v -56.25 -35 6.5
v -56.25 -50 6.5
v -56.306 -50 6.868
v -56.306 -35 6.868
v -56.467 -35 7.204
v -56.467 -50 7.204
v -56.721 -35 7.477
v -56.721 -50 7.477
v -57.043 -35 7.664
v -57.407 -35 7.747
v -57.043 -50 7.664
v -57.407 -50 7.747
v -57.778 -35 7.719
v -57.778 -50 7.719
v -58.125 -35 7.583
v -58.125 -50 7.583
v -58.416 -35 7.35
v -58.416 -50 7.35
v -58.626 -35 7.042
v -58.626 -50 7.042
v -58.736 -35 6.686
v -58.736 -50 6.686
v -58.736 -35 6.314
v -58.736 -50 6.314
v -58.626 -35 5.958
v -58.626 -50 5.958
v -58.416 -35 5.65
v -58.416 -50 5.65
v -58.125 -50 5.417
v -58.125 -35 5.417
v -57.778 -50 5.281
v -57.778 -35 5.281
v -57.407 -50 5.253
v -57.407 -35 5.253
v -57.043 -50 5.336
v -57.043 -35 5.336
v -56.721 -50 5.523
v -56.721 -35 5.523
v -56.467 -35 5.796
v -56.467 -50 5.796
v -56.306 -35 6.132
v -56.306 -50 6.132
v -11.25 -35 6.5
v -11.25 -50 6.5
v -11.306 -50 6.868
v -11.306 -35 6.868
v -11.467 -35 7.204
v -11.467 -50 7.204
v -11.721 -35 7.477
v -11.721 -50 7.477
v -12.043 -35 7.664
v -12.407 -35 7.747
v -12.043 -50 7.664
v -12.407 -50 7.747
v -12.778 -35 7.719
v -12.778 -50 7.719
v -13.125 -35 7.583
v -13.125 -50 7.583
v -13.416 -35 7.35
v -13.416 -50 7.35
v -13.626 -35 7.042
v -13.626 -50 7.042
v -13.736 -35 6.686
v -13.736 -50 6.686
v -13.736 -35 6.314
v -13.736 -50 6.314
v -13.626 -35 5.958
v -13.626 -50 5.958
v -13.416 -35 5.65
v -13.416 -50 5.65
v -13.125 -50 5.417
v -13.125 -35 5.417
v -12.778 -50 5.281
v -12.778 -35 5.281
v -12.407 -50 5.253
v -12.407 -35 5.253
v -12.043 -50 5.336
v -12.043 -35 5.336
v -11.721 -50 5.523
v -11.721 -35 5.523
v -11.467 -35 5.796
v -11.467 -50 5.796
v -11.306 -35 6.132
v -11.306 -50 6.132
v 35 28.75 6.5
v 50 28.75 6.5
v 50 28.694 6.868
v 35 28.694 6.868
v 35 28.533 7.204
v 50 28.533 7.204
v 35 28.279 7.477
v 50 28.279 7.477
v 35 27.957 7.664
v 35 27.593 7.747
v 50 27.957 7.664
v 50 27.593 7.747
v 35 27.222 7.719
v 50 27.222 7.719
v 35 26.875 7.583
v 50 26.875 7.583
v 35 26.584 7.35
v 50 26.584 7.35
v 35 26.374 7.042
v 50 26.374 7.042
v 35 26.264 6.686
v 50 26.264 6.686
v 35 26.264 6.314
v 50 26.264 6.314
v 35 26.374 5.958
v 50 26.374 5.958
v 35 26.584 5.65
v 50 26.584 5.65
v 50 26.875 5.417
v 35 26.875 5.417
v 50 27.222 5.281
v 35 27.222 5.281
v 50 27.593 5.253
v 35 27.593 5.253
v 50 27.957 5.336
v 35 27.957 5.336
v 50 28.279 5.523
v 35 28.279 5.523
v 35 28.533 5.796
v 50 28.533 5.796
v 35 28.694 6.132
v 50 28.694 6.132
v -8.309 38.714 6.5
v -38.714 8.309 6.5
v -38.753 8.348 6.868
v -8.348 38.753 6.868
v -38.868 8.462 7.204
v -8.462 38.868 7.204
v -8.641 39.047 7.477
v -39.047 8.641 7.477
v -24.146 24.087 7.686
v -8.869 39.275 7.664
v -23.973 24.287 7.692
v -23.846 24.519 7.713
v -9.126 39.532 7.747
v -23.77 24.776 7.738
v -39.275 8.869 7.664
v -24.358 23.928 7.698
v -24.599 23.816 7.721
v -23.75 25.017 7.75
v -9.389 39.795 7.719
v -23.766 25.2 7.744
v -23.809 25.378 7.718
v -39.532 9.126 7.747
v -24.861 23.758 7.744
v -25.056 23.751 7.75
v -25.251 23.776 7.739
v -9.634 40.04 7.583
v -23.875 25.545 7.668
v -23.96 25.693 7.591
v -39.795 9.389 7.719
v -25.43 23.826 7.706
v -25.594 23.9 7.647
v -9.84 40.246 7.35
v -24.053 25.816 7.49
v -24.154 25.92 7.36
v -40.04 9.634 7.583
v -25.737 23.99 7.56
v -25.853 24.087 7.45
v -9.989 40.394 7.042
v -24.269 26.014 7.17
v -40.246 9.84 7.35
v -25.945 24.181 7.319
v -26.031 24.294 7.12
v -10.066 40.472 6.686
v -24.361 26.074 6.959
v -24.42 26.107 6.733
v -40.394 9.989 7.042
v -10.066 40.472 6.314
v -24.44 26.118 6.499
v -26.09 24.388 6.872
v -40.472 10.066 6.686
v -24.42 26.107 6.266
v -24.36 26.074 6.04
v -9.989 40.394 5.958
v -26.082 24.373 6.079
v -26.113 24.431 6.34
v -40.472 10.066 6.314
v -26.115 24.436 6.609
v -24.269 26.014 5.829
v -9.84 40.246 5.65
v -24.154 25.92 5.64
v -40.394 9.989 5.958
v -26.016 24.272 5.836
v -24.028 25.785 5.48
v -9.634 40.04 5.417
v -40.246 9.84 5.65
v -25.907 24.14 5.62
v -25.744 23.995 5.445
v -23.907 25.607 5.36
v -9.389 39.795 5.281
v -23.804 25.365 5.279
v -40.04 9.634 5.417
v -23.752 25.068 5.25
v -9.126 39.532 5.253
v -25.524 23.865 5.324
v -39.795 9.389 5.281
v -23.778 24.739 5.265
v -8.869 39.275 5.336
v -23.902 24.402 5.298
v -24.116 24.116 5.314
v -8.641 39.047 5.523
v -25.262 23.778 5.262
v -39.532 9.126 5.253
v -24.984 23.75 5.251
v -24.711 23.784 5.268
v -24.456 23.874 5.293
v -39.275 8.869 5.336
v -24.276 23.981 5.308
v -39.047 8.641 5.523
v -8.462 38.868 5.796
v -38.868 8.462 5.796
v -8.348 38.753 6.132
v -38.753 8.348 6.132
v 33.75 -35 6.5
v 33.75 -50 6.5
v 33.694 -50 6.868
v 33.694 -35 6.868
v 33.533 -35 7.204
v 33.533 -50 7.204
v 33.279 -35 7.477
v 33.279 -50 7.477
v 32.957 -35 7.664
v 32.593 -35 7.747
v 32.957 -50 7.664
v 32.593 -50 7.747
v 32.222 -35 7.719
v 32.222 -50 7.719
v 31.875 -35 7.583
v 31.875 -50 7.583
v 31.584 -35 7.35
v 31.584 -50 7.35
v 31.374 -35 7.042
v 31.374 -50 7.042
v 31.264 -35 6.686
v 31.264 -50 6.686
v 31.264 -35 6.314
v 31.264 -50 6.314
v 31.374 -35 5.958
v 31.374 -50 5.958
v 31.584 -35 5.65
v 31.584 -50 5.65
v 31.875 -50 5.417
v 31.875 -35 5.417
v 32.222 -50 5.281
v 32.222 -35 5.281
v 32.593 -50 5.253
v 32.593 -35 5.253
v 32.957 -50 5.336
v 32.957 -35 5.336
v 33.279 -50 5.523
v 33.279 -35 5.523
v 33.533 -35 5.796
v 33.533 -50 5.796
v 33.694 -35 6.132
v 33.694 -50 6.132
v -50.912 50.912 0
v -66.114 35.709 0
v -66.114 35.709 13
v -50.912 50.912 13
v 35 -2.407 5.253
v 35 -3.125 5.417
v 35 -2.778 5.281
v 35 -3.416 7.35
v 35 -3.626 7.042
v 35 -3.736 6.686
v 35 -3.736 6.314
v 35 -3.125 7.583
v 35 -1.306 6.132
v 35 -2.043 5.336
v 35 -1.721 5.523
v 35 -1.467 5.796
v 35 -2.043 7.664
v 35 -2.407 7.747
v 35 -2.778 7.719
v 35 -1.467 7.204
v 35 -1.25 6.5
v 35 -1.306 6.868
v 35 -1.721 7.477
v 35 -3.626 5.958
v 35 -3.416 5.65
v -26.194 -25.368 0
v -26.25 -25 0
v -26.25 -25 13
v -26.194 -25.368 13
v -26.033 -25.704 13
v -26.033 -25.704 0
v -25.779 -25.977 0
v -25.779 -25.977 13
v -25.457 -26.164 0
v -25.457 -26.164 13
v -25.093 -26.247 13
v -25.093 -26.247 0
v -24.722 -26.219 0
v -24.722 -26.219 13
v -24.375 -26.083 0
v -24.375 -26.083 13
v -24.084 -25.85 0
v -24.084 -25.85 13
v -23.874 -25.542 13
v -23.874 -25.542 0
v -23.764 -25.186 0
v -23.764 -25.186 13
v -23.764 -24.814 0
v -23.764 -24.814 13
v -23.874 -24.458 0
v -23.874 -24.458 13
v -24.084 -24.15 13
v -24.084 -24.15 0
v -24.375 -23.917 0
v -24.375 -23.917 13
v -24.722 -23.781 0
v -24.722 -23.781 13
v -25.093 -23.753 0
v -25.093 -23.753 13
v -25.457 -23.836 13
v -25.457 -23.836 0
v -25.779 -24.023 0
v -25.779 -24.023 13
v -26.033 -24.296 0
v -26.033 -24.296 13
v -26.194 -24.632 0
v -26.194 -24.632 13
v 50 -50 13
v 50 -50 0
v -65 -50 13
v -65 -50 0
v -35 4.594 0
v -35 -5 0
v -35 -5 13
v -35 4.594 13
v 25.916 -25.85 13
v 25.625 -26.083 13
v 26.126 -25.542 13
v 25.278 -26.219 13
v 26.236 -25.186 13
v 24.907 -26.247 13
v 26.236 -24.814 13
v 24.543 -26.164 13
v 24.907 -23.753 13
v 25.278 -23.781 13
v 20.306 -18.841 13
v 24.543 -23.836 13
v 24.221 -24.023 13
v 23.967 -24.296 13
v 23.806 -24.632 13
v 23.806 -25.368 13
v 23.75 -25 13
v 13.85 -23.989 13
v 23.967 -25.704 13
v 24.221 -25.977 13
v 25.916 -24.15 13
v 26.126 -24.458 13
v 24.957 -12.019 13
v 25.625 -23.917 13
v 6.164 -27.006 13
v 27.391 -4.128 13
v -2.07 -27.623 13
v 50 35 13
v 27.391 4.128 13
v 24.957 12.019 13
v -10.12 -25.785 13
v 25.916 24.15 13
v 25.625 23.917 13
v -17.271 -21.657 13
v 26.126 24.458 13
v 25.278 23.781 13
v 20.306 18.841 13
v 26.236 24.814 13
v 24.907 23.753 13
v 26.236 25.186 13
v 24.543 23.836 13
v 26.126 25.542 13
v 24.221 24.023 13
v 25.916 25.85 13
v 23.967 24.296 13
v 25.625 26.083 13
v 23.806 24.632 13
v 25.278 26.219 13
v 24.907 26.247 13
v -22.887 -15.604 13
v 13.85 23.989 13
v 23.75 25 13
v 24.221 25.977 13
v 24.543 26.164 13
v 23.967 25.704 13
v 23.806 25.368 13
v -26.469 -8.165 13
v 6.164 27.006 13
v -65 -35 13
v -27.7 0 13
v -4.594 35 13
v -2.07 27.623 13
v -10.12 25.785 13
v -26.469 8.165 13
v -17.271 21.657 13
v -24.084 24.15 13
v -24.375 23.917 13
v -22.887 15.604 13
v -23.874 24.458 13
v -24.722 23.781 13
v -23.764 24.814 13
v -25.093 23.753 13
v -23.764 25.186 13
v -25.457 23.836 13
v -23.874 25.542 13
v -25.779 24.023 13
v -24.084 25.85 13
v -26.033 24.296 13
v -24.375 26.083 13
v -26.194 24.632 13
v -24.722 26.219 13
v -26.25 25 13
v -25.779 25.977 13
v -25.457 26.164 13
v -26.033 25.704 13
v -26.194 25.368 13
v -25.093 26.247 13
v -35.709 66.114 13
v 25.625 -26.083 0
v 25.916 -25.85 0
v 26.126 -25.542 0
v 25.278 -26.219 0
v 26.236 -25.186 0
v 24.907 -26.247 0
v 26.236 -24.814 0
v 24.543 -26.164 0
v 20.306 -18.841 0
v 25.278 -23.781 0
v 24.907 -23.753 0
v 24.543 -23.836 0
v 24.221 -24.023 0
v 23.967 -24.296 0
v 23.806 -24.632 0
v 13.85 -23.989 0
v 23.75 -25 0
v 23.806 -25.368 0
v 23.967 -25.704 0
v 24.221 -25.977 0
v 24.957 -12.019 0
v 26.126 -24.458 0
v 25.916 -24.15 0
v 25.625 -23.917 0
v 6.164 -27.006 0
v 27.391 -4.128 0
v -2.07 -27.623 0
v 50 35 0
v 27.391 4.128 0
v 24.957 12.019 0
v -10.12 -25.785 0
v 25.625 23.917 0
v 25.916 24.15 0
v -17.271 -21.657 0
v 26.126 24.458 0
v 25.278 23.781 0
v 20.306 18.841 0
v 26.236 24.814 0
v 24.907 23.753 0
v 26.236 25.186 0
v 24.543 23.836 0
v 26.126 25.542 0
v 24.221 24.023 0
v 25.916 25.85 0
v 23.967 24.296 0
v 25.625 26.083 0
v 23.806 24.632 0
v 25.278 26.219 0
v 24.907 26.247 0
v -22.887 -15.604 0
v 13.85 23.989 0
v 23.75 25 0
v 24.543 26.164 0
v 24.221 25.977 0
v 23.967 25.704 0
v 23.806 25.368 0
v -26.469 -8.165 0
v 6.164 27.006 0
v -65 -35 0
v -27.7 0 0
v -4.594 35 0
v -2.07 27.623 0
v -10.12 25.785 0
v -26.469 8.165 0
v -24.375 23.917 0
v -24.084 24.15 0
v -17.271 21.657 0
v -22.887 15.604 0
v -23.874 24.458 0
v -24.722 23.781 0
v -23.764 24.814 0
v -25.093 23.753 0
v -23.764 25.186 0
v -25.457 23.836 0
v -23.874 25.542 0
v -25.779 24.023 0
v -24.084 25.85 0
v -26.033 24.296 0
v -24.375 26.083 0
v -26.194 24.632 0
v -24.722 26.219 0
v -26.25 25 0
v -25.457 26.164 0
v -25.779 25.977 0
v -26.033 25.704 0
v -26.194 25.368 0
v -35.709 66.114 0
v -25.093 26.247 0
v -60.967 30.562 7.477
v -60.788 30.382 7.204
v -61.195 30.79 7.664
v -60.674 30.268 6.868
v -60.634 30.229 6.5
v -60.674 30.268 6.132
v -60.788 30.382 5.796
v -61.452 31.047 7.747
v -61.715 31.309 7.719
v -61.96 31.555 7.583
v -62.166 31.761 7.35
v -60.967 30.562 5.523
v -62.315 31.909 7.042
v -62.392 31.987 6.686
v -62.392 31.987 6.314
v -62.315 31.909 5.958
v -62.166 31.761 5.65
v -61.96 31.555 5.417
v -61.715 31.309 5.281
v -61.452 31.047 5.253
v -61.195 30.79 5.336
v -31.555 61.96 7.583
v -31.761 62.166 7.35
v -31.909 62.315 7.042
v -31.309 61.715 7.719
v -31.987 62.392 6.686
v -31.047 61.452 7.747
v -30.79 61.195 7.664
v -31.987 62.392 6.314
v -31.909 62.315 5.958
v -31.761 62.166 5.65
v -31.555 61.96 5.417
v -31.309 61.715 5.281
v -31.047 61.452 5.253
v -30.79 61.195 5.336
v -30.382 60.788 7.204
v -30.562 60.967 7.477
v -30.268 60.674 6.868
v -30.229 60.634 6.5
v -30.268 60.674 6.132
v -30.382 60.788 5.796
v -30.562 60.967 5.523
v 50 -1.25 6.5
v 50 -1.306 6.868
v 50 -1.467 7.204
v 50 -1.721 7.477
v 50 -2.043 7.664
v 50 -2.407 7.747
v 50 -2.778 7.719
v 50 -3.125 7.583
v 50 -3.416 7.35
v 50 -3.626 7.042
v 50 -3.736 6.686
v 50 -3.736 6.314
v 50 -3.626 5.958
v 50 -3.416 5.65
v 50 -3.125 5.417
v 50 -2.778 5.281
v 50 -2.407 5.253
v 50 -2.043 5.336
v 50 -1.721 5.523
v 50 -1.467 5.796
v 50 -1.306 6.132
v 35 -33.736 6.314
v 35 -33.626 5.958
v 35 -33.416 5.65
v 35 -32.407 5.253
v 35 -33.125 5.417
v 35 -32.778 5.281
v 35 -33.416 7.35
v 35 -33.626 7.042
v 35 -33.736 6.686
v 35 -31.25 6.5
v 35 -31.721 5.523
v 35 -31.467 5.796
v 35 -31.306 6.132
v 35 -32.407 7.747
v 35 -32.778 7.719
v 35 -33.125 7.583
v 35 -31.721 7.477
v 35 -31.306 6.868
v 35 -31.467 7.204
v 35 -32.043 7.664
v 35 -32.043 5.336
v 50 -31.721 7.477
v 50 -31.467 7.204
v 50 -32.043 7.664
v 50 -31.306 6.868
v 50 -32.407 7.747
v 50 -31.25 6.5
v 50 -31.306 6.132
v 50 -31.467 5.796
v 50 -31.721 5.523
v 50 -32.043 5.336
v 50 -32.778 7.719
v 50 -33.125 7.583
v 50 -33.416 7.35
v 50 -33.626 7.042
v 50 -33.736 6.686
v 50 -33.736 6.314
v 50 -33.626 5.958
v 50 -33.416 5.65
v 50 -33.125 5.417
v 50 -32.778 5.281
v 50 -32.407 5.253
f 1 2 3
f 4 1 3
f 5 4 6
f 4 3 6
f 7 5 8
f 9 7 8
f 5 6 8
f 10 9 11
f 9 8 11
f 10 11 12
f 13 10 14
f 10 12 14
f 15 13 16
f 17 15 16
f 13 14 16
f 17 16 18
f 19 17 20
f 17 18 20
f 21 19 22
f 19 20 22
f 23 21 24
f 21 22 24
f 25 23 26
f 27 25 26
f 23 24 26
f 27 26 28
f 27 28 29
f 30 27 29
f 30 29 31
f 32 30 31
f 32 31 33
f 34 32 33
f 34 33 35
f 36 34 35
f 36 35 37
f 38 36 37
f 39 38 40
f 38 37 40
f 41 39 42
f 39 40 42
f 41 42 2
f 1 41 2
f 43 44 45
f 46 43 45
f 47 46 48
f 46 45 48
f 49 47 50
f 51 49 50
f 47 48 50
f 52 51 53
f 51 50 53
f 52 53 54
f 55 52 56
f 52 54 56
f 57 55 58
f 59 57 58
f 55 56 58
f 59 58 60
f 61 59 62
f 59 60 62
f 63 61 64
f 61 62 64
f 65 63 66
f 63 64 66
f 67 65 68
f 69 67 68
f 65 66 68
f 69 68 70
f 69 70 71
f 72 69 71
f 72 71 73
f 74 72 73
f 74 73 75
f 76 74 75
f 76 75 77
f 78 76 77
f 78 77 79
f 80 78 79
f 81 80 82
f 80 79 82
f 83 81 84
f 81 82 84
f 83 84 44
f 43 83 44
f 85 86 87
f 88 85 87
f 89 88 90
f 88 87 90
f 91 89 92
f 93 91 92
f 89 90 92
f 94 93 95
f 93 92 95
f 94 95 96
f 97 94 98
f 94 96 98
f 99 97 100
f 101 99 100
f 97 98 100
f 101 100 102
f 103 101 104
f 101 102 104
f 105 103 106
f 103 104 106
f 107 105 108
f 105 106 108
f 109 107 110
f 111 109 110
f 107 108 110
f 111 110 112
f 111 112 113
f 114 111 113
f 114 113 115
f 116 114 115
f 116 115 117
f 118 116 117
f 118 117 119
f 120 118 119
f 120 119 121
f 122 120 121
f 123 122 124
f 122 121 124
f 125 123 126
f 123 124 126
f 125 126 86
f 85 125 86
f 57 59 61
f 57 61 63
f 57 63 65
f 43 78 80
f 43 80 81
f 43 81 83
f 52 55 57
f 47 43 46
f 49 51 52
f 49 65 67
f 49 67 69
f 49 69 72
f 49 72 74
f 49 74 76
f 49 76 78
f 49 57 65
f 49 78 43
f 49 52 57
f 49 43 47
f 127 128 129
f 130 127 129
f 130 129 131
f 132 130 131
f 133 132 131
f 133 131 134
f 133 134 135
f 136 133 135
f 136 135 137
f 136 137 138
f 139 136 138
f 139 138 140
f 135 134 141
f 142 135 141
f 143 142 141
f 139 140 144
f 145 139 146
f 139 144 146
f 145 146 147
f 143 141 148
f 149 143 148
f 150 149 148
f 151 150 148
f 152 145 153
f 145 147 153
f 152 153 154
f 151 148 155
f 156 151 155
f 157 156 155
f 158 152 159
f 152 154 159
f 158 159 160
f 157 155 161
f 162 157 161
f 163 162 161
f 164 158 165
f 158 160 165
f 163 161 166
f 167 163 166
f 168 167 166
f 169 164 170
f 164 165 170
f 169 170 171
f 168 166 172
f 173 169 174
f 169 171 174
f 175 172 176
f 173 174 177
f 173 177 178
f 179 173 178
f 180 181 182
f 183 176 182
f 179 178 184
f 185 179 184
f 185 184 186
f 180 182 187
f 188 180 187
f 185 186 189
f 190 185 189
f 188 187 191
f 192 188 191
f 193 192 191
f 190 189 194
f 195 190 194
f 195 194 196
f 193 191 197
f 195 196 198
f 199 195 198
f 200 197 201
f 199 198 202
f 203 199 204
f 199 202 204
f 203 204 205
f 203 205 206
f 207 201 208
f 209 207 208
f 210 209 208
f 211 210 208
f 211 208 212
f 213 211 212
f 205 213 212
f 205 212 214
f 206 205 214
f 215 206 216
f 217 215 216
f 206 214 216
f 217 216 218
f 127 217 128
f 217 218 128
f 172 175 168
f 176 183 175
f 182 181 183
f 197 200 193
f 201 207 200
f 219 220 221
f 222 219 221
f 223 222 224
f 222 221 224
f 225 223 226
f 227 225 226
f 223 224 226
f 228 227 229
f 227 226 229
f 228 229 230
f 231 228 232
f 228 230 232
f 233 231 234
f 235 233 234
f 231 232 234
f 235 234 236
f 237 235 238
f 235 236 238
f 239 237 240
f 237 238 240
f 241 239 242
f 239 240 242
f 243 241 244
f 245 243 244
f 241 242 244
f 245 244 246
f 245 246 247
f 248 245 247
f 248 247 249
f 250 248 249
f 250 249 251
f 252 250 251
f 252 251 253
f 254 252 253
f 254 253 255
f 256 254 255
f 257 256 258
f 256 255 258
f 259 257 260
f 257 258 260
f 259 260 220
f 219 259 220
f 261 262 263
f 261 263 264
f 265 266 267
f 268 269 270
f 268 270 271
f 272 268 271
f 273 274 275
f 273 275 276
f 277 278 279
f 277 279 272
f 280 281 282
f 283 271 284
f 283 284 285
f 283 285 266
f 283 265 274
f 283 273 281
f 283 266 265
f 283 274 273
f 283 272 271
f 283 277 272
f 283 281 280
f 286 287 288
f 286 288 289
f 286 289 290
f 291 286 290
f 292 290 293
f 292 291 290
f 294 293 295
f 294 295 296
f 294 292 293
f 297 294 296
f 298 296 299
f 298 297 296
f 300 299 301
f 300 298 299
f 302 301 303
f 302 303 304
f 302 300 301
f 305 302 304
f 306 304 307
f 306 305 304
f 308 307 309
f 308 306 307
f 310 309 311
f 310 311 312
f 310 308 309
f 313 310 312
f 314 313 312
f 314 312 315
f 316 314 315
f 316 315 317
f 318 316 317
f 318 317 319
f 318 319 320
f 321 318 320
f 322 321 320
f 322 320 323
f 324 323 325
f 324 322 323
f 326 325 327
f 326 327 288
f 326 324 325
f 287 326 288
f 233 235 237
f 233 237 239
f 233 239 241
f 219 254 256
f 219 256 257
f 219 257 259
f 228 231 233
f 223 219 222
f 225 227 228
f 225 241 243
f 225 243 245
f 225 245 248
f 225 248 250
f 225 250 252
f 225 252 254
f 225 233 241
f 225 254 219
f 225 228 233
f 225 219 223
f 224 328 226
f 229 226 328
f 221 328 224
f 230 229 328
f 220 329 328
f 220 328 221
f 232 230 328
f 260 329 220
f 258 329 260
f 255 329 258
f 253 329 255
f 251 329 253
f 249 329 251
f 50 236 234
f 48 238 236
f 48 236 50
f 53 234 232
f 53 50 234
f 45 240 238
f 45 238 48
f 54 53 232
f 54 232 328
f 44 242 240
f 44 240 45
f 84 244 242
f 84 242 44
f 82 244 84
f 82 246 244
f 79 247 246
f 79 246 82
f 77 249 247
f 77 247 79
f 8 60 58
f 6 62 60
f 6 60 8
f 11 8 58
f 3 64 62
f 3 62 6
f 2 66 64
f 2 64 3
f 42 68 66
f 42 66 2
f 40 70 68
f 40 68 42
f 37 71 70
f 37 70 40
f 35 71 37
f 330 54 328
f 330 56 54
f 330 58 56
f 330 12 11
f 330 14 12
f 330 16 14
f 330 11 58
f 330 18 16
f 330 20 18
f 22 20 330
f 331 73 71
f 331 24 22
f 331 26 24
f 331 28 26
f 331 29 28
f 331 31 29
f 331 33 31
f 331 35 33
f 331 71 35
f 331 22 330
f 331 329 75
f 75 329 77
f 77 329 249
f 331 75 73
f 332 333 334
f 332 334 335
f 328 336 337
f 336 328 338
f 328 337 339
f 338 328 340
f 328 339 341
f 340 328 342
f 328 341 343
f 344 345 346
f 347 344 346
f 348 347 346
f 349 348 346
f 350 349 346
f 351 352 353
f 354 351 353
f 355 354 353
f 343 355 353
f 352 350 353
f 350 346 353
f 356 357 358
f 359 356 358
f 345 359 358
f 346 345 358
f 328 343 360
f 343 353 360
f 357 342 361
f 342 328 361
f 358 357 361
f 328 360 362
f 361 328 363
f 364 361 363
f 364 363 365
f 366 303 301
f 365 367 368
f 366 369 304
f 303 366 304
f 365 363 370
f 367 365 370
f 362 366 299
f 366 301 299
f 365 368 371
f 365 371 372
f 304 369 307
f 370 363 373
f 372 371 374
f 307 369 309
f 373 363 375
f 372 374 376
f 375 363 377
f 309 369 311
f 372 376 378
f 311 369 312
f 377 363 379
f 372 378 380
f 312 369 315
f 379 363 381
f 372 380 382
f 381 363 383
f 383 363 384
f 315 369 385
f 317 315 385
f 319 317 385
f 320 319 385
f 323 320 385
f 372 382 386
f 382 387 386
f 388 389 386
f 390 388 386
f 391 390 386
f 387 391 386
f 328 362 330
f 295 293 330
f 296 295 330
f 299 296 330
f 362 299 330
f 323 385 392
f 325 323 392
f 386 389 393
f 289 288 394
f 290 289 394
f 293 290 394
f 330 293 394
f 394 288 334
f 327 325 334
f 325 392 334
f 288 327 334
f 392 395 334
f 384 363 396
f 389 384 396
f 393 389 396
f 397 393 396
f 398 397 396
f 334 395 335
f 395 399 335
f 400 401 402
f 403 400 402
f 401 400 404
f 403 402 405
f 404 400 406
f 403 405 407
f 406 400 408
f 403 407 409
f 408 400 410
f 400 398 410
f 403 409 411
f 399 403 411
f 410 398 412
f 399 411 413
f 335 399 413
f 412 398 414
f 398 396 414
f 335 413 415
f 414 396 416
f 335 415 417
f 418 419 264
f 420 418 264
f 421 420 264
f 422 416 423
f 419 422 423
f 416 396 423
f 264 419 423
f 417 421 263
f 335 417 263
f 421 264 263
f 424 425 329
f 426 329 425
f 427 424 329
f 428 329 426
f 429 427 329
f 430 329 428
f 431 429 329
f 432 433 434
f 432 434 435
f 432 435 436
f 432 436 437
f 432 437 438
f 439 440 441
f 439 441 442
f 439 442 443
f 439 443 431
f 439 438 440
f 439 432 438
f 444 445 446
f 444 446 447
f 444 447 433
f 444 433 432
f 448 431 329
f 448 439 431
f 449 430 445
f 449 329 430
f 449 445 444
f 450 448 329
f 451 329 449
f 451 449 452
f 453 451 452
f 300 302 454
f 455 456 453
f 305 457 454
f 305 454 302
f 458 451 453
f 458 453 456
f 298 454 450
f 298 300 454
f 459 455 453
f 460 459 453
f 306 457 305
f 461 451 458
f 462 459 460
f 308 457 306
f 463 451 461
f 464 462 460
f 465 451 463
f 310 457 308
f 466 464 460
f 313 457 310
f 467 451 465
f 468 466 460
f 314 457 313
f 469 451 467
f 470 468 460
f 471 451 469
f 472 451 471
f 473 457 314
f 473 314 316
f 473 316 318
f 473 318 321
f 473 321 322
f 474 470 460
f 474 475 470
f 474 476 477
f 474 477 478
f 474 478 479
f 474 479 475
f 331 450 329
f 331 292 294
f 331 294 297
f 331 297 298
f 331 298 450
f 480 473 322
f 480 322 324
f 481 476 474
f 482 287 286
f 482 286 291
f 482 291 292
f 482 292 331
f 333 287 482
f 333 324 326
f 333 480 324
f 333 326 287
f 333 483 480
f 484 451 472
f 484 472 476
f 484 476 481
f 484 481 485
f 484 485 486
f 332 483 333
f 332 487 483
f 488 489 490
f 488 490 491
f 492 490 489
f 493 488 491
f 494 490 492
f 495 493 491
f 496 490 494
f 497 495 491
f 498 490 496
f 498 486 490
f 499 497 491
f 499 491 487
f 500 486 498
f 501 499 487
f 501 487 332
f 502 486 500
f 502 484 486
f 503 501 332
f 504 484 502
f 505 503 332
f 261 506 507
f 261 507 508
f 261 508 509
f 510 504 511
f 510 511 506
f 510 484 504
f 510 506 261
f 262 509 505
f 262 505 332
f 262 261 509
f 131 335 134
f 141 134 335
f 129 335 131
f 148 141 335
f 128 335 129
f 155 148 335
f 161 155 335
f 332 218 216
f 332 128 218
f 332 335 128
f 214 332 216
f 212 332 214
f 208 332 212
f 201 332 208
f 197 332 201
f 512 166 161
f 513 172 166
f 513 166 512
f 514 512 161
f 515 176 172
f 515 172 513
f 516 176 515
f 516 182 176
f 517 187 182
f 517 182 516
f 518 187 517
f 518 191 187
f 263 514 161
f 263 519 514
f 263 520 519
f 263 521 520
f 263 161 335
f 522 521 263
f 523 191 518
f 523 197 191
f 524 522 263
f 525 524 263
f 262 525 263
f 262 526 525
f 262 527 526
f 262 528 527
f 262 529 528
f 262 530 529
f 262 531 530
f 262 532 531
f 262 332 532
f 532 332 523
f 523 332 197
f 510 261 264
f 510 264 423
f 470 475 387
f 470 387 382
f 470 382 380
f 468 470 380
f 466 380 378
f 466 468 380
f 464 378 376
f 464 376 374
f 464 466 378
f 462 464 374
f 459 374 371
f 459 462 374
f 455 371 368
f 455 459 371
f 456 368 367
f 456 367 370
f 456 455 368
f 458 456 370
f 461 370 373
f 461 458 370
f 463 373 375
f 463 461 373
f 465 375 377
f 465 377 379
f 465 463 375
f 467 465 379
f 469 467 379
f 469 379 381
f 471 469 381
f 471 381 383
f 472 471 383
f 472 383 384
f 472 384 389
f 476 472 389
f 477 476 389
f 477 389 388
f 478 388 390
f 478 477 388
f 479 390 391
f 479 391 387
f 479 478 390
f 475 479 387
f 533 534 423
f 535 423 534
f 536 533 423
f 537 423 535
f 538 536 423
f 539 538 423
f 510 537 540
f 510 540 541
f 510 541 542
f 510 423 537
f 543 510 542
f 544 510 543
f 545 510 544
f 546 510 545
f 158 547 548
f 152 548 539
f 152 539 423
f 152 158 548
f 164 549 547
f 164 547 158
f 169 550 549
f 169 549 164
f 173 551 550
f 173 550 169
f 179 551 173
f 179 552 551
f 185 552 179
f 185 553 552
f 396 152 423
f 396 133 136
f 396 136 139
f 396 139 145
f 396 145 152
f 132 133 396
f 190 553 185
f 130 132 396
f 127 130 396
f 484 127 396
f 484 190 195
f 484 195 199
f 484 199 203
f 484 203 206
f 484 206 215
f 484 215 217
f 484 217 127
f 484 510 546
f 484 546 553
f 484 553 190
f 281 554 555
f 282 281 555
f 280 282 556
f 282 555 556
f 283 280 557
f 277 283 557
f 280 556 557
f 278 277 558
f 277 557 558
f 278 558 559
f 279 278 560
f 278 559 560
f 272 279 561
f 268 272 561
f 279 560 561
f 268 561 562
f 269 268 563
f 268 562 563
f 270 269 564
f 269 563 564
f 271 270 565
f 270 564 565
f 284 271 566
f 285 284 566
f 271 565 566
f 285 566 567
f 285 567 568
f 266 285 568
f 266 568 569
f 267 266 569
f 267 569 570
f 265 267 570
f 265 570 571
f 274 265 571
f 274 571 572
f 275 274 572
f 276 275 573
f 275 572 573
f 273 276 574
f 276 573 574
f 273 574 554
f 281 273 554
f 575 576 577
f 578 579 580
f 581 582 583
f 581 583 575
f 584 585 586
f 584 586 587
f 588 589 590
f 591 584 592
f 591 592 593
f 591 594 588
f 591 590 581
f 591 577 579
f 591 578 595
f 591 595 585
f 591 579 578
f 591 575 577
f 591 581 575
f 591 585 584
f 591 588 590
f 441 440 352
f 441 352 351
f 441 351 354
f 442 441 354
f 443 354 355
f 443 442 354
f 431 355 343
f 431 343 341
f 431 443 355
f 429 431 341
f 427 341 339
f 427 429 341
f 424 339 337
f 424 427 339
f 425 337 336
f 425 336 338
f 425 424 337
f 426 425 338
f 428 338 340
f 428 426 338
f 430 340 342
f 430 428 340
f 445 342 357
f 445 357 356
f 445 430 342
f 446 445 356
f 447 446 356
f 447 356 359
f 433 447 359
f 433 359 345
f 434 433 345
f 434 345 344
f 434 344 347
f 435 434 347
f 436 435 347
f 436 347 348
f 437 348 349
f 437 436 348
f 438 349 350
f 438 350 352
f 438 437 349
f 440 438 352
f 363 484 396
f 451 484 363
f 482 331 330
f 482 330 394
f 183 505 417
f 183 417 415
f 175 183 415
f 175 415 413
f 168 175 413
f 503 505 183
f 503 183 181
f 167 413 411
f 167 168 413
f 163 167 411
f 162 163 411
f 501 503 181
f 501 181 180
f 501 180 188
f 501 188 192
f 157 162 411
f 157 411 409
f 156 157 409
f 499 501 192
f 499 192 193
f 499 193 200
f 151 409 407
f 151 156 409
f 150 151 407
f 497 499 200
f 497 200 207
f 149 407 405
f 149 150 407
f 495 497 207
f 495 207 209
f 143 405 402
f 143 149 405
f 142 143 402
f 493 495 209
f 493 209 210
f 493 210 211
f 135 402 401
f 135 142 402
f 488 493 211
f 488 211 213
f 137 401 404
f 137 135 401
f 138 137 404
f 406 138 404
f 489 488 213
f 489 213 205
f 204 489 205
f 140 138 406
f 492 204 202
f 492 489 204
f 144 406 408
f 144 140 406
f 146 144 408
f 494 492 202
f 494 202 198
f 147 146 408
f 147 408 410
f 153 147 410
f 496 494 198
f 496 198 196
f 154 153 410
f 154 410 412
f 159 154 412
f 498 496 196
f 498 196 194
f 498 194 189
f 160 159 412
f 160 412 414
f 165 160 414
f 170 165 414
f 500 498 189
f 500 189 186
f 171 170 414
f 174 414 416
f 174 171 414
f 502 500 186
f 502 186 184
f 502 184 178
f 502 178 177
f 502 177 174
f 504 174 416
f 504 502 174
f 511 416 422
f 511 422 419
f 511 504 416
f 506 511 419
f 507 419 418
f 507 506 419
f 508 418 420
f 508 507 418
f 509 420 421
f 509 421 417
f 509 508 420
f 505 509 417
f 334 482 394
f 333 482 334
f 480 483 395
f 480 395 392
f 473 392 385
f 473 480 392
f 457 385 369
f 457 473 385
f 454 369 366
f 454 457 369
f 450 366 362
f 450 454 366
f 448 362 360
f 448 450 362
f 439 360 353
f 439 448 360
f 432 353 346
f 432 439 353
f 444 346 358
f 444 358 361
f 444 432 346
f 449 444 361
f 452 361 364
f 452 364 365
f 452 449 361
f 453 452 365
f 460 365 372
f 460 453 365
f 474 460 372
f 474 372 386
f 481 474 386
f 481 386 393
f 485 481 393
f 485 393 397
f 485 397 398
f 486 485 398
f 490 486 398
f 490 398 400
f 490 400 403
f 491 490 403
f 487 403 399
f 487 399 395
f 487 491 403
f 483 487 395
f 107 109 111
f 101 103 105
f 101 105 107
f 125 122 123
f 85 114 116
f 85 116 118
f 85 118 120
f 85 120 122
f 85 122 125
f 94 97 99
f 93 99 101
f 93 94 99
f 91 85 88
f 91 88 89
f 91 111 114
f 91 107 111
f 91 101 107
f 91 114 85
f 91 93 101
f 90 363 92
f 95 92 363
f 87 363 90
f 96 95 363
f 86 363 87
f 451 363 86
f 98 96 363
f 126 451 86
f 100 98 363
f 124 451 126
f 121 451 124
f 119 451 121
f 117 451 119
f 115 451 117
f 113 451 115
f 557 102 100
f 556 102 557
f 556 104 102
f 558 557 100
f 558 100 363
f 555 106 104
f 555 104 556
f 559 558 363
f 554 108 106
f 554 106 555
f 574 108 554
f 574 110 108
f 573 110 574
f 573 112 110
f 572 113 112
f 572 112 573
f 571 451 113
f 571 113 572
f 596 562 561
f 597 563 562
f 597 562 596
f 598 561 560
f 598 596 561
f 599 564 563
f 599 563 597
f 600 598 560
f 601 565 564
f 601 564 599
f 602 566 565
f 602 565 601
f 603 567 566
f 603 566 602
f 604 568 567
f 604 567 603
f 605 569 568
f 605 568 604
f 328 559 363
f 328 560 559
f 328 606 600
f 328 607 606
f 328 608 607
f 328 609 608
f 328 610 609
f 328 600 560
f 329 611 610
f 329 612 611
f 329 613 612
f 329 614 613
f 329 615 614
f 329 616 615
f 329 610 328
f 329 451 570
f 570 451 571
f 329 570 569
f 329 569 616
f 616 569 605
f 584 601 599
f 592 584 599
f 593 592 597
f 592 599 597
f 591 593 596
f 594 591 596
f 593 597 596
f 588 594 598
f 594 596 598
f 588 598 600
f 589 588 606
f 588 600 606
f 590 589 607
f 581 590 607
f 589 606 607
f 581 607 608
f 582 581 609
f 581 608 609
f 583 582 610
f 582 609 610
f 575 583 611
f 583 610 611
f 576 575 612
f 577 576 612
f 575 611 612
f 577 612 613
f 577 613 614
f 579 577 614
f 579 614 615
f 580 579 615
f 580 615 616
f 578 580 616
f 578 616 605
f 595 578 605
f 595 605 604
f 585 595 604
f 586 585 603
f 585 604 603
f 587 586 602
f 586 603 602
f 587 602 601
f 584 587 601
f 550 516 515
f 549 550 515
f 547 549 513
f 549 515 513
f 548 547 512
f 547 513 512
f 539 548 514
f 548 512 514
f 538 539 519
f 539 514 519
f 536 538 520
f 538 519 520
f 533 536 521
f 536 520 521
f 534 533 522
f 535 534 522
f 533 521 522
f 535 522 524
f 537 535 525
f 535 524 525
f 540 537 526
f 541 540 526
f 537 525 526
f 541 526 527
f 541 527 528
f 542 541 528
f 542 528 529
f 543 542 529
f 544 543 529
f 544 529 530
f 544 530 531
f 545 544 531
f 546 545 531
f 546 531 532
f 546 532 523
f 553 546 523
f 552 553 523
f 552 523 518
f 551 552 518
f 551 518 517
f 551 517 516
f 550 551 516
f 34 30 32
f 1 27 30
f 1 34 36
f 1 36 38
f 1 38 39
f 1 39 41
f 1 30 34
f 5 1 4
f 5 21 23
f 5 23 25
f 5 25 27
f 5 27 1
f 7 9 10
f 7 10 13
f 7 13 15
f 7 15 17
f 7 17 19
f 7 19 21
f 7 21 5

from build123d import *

# Parameters (mm, degrees)
SKETCH1_R           = 27.7
SKETCH1_R_2         = 1.25
BOSS_EXTRUDE1_DEPTH = 13
CUT_EXTRUDE1_REACH  = 107.038
SKETCH2_R           = 1.25
SKETCH3_R           = 1.25
CUT_EXTRUDE2_DEPTH  = 15
SKETCH4_R           = 1.25
CUT_EXTRUDE3_DEPTH  = 15


with BuildPart() as part:
    # Sketch1 → Boss-Extrude1 (new body)
    with BuildSketch(Plane.XY):
        Polygon((50, 35), (50, -50), (-65, -50), (-65, -35), (-35, -5), (-35, 4.594408409), (-66.114484041, 35.70889245), (-50.911688245, 50.911688245), (-35.70889245, 66.114484041), (-4.594408409, 35), align=None)
        with Locations(Location((0, 0, 0), (0, 0, 180))):
            Circle(SKETCH1_R, mode=Mode.SUBTRACT)
        with Locations(Location((-25, 25, 0), (0, 0, 180))):
            Circle(SKETCH1_R_2, mode=Mode.SUBTRACT)
        with Locations(Location((25, 25, 0), (0, 0, 180))):
            Circle(SKETCH1_R_2, mode=Mode.SUBTRACT)
        with Locations(Location((25, -25, 0), (0, 0, 180))):
            Circle(SKETCH1_R_2, mode=Mode.SUBTRACT)
        with Locations(Location((-25, -25, 0), (0, 0, 180))):
            Circle(SKETCH1_R_2, mode=Mode.SUBTRACT)
    extrude(amount=BOSS_EXTRUDE1_DEPTH)

    # Sketch2 → Cut-Extrude1 (cut, up to next)
    with BuildSketch(Plane(origin=(-15.202795796, -15.202795796, 0), x_dir=(0, 0, 1), z_dir=(-0.7071067811865472, -0.7071067811865478, 0)), mode=Mode.PRIVATE) as cut_extrude1_sk1:
        with Locations(Location((6.5, 65.5, 0), (0, 0, 270))):
            Circle(SKETCH2_R)
    cut_extrude1_tool1 = extrude(cut_extrude1_sk1.sketch, amount=-CUT_EXTRUDE1_REACH, mode=Mode.PRIVATE) & part.part
    # Sketch2 → Cut-Extrude1 (cut, up to next)
    with BuildSketch(Plane(origin=(-15.202795796, -15.202795796, 0), x_dir=(0, 0, 1), z_dir=(-0.7071067811865472, -0.7071067811865478, 0)), mode=Mode.PRIVATE) as cut_extrude1_sk2:
        with Locations(Location((6.5, 34.5, 0), (0, 0, 270))):
            Circle(SKETCH2_R)
    cut_extrude1_tool2 = extrude(cut_extrude1_sk2.sketch, amount=-CUT_EXTRUDE1_REACH, mode=Mode.PRIVATE) & part.part
    add(cut_extrude1_tool1.solids().sort_by_distance((-61.51829, 31.112698, 6.5))[0], mode=Mode.SUBTRACT)
    add(cut_extrude1_tool2.solids().sort_by_distance((-39.59798, 9.192388, 6.5))[0], mode=Mode.SUBTRACT)

    # Sketch3 → Cut-Extrude2 (cut)
    with BuildSketch(Plane.XZ.offset(50)):
        with Locations((-57.5, 6.5)):
            Circle(SKETCH3_R)
        with Locations((32.5, 6.5)):
            Circle(SKETCH3_R)
        with Locations((-12.5, 6.5)):
            Circle(SKETCH3_R)
    extrude(amount=-CUT_EXTRUDE2_DEPTH, mode=Mode.SUBTRACT)

    # Sketch4 → Cut-Extrude3 (cut)
    with BuildSketch(Plane(origin=(50, 0, 0), x_dir=(0, 0, -1), z_dir=(1, 0, 0))):
        with Locations(Location((-6.5, -32.5, 0), (0, 0, 90))):
            Circle(SKETCH4_R)
        with Locations(Location((-6.5, 27.5, 0), (0, 0, 90))):
            Circle(SKETCH4_R)
        with Locations(Location((-6.5, -2.5, 0), (0, 0, 90))):
            Circle(SKETCH4_R)
    extrude(amount=-CUT_EXTRUDE3_DEPTH, mode=Mode.SUBTRACT)


solid = part.part
